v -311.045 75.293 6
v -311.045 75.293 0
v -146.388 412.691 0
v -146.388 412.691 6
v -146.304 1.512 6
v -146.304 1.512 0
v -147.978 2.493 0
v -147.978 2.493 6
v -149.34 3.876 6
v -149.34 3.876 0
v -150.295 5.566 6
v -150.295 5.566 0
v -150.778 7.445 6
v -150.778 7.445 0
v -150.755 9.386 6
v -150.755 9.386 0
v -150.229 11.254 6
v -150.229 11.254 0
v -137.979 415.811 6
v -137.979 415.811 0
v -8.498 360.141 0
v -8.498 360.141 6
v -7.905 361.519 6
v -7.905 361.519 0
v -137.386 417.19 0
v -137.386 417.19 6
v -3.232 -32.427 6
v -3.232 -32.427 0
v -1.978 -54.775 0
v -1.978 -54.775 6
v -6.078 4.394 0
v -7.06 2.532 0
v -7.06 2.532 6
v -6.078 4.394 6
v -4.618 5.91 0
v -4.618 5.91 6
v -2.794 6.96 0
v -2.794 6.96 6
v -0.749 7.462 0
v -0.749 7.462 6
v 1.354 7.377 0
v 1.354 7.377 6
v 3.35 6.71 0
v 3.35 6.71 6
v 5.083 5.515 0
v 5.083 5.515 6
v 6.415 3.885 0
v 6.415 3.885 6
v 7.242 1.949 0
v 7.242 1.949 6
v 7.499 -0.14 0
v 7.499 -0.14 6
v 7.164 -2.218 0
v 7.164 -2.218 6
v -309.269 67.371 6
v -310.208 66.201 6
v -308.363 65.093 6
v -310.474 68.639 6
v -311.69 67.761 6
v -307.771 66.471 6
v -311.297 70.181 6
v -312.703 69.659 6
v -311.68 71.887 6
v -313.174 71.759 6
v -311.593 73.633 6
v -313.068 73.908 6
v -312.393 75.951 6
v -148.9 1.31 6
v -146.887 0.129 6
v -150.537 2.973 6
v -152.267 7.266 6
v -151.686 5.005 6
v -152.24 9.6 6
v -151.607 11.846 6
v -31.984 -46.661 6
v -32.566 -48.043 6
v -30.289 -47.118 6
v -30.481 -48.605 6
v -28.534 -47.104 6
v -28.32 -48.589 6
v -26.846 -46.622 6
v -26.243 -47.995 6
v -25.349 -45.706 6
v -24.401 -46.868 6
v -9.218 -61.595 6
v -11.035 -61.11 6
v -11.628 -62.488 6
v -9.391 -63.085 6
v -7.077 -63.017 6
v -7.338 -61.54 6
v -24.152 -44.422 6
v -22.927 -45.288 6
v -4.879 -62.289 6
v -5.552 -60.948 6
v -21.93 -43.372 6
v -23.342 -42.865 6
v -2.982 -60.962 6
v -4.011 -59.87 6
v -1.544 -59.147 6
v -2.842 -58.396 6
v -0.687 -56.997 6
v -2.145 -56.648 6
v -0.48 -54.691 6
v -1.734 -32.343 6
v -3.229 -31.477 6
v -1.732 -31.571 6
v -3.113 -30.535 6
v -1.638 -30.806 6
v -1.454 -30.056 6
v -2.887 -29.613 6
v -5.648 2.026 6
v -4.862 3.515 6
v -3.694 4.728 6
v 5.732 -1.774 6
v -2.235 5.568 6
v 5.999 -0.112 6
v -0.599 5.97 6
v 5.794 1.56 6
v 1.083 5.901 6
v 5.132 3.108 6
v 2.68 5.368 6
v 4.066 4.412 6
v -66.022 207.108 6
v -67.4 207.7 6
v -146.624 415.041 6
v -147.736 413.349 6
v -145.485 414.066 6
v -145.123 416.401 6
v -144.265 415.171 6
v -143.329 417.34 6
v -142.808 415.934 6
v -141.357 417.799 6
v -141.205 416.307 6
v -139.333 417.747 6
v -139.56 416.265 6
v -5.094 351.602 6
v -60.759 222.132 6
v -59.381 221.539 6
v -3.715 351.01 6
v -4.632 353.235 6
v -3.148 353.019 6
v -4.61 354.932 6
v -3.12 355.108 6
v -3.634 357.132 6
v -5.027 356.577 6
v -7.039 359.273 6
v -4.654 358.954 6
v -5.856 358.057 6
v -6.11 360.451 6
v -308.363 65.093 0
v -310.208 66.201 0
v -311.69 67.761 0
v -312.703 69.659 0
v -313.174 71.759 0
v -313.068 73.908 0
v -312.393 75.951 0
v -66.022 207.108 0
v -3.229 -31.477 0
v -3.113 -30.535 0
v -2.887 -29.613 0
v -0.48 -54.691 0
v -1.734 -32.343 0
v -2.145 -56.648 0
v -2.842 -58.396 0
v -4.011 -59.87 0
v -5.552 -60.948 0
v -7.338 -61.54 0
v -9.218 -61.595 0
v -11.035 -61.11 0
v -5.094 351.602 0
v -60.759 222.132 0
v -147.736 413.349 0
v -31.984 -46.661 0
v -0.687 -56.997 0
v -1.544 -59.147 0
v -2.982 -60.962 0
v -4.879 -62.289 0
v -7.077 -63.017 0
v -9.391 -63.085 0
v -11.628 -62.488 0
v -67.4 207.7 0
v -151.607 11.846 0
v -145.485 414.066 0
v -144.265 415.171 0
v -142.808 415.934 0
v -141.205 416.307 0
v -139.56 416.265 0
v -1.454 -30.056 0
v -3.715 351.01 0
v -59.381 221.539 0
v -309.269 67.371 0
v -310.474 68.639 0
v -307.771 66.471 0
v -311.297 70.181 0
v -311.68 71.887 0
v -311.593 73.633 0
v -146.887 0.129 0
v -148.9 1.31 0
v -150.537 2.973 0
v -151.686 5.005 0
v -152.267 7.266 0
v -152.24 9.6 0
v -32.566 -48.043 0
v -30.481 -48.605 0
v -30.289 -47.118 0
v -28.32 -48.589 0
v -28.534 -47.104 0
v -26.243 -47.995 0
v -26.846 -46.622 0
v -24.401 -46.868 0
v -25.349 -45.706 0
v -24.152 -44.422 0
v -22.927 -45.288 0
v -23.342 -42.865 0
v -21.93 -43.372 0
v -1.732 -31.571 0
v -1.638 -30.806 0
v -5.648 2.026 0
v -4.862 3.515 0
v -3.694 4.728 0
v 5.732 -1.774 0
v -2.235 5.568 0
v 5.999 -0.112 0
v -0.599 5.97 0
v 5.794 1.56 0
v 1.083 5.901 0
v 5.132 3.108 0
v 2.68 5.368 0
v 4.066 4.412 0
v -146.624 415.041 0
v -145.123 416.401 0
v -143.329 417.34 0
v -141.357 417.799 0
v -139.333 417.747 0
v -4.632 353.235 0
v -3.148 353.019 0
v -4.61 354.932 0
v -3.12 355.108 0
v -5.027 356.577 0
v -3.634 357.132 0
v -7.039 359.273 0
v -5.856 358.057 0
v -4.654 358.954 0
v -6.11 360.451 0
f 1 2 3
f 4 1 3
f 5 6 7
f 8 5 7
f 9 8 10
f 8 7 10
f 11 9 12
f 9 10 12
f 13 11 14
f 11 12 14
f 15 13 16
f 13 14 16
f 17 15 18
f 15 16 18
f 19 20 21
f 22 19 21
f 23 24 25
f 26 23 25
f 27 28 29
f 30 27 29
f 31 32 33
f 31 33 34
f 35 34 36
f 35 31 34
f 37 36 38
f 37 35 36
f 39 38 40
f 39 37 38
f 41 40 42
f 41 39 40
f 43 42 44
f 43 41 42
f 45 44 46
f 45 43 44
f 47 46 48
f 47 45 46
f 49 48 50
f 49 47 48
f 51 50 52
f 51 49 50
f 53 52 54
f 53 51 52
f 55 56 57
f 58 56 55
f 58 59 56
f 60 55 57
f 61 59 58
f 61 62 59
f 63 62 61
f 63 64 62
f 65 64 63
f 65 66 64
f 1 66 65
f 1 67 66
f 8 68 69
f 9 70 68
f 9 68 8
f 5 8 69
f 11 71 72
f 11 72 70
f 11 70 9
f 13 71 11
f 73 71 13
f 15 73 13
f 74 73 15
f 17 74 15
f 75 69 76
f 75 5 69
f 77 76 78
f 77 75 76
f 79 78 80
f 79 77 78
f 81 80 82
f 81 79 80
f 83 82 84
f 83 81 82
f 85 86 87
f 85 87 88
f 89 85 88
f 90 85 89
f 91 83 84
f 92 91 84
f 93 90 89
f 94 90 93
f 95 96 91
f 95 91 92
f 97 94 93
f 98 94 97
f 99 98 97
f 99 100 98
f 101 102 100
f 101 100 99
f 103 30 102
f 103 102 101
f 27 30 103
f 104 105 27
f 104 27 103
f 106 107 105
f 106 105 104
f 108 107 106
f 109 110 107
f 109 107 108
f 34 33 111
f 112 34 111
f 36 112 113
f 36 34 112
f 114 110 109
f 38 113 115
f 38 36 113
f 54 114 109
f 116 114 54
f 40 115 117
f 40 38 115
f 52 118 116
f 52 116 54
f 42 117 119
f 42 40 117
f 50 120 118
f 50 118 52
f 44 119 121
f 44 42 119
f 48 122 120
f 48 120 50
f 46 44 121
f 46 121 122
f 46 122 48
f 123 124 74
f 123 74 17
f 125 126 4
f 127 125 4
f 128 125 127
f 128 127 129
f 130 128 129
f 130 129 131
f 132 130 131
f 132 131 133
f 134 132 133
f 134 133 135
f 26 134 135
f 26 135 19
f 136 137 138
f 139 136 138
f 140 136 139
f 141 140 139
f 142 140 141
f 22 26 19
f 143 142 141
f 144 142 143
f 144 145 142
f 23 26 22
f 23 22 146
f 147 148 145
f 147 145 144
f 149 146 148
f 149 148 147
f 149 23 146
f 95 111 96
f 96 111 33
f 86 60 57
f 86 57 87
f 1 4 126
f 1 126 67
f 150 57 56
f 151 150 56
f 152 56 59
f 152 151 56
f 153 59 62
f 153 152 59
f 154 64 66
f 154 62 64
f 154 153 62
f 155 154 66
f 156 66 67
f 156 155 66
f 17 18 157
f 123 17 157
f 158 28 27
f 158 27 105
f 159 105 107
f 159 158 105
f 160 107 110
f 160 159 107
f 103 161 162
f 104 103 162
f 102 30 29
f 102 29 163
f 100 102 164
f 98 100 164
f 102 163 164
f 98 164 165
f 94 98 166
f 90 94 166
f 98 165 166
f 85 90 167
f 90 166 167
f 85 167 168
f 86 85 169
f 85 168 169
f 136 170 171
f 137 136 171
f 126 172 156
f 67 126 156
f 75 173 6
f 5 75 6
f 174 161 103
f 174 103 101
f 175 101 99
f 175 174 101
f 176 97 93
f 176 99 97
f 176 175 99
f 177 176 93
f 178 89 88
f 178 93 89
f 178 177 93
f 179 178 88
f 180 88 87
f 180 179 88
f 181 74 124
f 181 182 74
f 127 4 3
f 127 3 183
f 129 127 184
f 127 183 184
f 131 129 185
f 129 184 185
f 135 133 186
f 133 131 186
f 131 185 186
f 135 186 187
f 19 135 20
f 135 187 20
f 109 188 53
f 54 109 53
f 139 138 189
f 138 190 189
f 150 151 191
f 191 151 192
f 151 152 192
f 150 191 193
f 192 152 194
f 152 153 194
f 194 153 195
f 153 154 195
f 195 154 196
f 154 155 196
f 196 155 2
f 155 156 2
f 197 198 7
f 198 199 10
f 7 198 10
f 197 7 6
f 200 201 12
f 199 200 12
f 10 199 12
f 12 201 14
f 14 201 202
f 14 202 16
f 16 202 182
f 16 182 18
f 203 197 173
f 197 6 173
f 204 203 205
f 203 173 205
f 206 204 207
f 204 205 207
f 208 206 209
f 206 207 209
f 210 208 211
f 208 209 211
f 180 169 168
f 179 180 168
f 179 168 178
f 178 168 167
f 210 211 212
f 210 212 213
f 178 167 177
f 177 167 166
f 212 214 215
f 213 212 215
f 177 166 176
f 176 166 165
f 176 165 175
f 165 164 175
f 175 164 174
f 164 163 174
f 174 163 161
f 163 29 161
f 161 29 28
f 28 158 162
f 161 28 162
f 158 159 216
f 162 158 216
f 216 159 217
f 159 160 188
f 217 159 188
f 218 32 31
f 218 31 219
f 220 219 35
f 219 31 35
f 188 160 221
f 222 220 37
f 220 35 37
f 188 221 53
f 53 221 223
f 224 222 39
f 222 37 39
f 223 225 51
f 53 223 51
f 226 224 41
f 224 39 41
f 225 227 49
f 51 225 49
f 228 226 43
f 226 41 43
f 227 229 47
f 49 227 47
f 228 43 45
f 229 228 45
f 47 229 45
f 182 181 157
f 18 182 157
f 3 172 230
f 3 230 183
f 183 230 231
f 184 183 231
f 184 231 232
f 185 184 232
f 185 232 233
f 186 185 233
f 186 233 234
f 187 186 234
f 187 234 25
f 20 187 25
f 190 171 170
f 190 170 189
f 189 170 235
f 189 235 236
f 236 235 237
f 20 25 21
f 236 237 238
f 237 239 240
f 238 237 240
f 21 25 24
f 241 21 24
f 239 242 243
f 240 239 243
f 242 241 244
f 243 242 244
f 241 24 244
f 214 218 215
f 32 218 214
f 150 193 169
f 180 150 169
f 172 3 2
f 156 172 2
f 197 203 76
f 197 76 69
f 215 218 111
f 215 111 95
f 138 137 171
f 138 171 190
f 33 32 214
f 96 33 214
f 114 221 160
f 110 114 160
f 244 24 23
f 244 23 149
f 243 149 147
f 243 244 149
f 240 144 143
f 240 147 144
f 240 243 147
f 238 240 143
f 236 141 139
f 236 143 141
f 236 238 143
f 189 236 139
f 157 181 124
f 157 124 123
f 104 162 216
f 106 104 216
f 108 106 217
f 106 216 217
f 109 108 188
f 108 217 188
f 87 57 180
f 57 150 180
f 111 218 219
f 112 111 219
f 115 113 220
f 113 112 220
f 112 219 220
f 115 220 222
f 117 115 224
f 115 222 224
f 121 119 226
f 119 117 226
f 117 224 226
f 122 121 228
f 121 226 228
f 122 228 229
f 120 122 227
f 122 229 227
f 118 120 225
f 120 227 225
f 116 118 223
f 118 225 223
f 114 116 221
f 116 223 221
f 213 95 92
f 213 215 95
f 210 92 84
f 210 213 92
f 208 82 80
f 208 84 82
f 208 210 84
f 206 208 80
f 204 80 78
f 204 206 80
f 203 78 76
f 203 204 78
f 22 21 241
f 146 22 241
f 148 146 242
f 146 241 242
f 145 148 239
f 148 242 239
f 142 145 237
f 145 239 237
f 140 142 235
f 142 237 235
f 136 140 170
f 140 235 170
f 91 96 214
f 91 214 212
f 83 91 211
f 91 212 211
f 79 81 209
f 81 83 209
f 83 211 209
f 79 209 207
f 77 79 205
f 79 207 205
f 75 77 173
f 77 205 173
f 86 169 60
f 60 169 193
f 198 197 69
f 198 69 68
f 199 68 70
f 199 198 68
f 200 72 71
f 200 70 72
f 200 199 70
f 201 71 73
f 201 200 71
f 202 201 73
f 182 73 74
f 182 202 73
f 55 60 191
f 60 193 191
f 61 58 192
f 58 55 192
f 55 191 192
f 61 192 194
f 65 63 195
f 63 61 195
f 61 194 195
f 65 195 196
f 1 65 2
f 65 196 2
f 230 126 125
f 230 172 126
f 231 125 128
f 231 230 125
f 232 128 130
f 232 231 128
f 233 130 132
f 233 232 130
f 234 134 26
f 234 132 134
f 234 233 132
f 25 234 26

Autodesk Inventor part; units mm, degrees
ref_plane "YZ Plane" through (0, 0, 0) normal (1, 0, 0) x (0, 1, 0)
ref_plane "XZ Plane" through (0, 0, 0) normal (0, 1, 0) x (-1, 0, 0)
ref_plane "XY Plane" through (0, 0, 0) normal (0, 0, 1) x (1, 0, 0)
sketch "Sketch1" plane through (0, 0, 0) normal (0, 0, 1) x (1, 0, 0)
  circle A0 centre (0, 0) radius 7.5 projected
  circle A1 centre (4.7555, -31.9787) radius 6.5 projected
  circle A2 centre (-29.46, -40.6707) radius 6.5 projected
  circle A3 centre (-8.4678, -55.1389) radius 6.5 projected
  circle A4 centre (-143.4307, 8.331) radius 7.4 projected
  circle A5 centre (-305.2033, 72.4426) radius 6.5 projected
  circle A6 centre (-140.546, 409.84) radius 6.5 projected
  circle A7 centre (-11.0649, 354.1696) radius 6.5 projected
  circle A8 centre (0, 0) radius 6 construction
  line L0 (5.7316, -1.7744) -> (-2.8867, -29.6128)
  arc A9 (-2.8867, -29.6128) -> (-3.232, -32.4269) centre (4.7555, -31.9787) ccw
  line L1 (-3.232, -32.4269) -> (-1.978, -54.7747)
  line L2 (-11.0352, -61.1103) -> (-307.7707, 66.4712)
  line L3 (-311.0448, 75.2934) -> (-146.3875, 412.6908)
  line L4 (-137.9786, 415.8114) -> (-8.4975, 360.141)
  line L5 (-5.0935, 351.6021) -> (-60.7594, 222.1316)
  line L6 (-5.6477, 2.0256) -> (-21.9297, -43.3715)
  arc A10 (-32.5665, -48.0429) -> (-21.9297, -43.3715) centre (-29.46, -40.6707) ccw
  line L7 (-32.5665, -48.0429) -> (-146.8867, 0.1294)
  arc A11 (-151.607, 11.8464) -> (-146.8867, 0.1294) centre (-143.4307, 8.331) ccw
  line L8 (-151.607, 11.8464) -> (-67.3996, 207.7001)
  arc A12 (-311.0448, 75.2934) -> (-307.7707, 66.4712) centre (-305.2033, 72.4426) ccw
  arc A13 (-137.9786, 415.8114) -> (-146.3875, 412.6908) centre (-140.546, 409.84) ccw
  arc A14 (-5.0935, 351.6021) -> (-8.4975, 360.141) centre (-11.0649, 354.1696) ccw
  arc A15 (5.7316, -1.7744) -> (-5.6477, 2.0256) centre (0, 0) ccw
  arc A16 (-11.0352, -61.1103) -> (-1.978, -54.7747) centre (-8.4678, -55.1389) ccw
  line L9 (-59.3813, 221.5391) -> (-3.7154, 351.0096)
  arc A17 (-3.7154, 351.0096) -> (-7.905, 361.519) centre (-11.0649, 354.1696) ccw
  line L10 (-7.905, 361.519) -> (-137.3861, 417.1895)
  arc A18 (-137.3861, 417.1895) -> (-147.7355, 413.3486) centre (-140.546, 409.84) ccw
  line L11 (-147.7355, 413.3486) -> (-312.3928, 75.9513)
  arc A19 (-312.3928, 75.9513) -> (-308.3632, 65.0932) centre (-305.2033, 72.4426) ccw
  line L12 (-308.3632, 65.0932) -> (-11.6277, -62.4884)
  arc A20 (-11.6277, -62.4884) -> (-0.4804, -54.6907) centre (-8.4678, -55.1389) ccw
  line L13 (-0.4804, -54.6907) -> (-1.7343, -32.3428)
  arc A21 (-1.4538, -30.0564) -> (-1.7343, -32.3428) centre (4.7555, -31.9787) ccw
  line L14 (-1.4538, -30.0564) -> (7.1645, -2.218)
  arc A22 (7.1645, -2.218) -> (-7.0597, 2.532) centre (0, 0) ccw
  line L15 (-7.0597, 2.532) -> (-23.3416, -42.8651)
  arc A23 (-31.9841, -46.6606) -> (-23.3416, -42.8651) centre (-29.46, -40.6707) ccw
  line L16 (-31.9841, -46.6606) -> (-146.3042, 1.5117)
  arc A24 (-150.2289, 11.2539) -> (-146.3042, 1.5117) centre (-143.4307, 8.331) ccw
  line L17 (-150.2289, 11.2539) -> (-66.0216, 207.1076)
  line L18 (-67.3996, 207.7001) -> (-66.0216, 207.1076)
  line L19 (-60.7594, 222.1316) -> (-59.3813, 221.5391)
  point P0 (0, 0)
  dimension "d0" = 12
  dimension "d1" = 1.5
  dimension "d2" = 1.5
  dimension "d3" = 1.5
  dimension "d4" = 1.5
extrude "Extrusion1" add sketch "Sketch1" along normal blind 6 contours A0 L0 A15 L6 | A0 L6 A10 L7 A11 L8 L18 L17 A4 L16 A2 L15 | L14 A1 L13 A20 L12 A19 L11 A18 L10 A17 L9 L19 L5 A7 L4 A6 L3 A5 L2 A3 L1 A9 L0 A0 picked at (-6.7626, -0.2729)
properties part number "BeltRight" material "Rubber"
